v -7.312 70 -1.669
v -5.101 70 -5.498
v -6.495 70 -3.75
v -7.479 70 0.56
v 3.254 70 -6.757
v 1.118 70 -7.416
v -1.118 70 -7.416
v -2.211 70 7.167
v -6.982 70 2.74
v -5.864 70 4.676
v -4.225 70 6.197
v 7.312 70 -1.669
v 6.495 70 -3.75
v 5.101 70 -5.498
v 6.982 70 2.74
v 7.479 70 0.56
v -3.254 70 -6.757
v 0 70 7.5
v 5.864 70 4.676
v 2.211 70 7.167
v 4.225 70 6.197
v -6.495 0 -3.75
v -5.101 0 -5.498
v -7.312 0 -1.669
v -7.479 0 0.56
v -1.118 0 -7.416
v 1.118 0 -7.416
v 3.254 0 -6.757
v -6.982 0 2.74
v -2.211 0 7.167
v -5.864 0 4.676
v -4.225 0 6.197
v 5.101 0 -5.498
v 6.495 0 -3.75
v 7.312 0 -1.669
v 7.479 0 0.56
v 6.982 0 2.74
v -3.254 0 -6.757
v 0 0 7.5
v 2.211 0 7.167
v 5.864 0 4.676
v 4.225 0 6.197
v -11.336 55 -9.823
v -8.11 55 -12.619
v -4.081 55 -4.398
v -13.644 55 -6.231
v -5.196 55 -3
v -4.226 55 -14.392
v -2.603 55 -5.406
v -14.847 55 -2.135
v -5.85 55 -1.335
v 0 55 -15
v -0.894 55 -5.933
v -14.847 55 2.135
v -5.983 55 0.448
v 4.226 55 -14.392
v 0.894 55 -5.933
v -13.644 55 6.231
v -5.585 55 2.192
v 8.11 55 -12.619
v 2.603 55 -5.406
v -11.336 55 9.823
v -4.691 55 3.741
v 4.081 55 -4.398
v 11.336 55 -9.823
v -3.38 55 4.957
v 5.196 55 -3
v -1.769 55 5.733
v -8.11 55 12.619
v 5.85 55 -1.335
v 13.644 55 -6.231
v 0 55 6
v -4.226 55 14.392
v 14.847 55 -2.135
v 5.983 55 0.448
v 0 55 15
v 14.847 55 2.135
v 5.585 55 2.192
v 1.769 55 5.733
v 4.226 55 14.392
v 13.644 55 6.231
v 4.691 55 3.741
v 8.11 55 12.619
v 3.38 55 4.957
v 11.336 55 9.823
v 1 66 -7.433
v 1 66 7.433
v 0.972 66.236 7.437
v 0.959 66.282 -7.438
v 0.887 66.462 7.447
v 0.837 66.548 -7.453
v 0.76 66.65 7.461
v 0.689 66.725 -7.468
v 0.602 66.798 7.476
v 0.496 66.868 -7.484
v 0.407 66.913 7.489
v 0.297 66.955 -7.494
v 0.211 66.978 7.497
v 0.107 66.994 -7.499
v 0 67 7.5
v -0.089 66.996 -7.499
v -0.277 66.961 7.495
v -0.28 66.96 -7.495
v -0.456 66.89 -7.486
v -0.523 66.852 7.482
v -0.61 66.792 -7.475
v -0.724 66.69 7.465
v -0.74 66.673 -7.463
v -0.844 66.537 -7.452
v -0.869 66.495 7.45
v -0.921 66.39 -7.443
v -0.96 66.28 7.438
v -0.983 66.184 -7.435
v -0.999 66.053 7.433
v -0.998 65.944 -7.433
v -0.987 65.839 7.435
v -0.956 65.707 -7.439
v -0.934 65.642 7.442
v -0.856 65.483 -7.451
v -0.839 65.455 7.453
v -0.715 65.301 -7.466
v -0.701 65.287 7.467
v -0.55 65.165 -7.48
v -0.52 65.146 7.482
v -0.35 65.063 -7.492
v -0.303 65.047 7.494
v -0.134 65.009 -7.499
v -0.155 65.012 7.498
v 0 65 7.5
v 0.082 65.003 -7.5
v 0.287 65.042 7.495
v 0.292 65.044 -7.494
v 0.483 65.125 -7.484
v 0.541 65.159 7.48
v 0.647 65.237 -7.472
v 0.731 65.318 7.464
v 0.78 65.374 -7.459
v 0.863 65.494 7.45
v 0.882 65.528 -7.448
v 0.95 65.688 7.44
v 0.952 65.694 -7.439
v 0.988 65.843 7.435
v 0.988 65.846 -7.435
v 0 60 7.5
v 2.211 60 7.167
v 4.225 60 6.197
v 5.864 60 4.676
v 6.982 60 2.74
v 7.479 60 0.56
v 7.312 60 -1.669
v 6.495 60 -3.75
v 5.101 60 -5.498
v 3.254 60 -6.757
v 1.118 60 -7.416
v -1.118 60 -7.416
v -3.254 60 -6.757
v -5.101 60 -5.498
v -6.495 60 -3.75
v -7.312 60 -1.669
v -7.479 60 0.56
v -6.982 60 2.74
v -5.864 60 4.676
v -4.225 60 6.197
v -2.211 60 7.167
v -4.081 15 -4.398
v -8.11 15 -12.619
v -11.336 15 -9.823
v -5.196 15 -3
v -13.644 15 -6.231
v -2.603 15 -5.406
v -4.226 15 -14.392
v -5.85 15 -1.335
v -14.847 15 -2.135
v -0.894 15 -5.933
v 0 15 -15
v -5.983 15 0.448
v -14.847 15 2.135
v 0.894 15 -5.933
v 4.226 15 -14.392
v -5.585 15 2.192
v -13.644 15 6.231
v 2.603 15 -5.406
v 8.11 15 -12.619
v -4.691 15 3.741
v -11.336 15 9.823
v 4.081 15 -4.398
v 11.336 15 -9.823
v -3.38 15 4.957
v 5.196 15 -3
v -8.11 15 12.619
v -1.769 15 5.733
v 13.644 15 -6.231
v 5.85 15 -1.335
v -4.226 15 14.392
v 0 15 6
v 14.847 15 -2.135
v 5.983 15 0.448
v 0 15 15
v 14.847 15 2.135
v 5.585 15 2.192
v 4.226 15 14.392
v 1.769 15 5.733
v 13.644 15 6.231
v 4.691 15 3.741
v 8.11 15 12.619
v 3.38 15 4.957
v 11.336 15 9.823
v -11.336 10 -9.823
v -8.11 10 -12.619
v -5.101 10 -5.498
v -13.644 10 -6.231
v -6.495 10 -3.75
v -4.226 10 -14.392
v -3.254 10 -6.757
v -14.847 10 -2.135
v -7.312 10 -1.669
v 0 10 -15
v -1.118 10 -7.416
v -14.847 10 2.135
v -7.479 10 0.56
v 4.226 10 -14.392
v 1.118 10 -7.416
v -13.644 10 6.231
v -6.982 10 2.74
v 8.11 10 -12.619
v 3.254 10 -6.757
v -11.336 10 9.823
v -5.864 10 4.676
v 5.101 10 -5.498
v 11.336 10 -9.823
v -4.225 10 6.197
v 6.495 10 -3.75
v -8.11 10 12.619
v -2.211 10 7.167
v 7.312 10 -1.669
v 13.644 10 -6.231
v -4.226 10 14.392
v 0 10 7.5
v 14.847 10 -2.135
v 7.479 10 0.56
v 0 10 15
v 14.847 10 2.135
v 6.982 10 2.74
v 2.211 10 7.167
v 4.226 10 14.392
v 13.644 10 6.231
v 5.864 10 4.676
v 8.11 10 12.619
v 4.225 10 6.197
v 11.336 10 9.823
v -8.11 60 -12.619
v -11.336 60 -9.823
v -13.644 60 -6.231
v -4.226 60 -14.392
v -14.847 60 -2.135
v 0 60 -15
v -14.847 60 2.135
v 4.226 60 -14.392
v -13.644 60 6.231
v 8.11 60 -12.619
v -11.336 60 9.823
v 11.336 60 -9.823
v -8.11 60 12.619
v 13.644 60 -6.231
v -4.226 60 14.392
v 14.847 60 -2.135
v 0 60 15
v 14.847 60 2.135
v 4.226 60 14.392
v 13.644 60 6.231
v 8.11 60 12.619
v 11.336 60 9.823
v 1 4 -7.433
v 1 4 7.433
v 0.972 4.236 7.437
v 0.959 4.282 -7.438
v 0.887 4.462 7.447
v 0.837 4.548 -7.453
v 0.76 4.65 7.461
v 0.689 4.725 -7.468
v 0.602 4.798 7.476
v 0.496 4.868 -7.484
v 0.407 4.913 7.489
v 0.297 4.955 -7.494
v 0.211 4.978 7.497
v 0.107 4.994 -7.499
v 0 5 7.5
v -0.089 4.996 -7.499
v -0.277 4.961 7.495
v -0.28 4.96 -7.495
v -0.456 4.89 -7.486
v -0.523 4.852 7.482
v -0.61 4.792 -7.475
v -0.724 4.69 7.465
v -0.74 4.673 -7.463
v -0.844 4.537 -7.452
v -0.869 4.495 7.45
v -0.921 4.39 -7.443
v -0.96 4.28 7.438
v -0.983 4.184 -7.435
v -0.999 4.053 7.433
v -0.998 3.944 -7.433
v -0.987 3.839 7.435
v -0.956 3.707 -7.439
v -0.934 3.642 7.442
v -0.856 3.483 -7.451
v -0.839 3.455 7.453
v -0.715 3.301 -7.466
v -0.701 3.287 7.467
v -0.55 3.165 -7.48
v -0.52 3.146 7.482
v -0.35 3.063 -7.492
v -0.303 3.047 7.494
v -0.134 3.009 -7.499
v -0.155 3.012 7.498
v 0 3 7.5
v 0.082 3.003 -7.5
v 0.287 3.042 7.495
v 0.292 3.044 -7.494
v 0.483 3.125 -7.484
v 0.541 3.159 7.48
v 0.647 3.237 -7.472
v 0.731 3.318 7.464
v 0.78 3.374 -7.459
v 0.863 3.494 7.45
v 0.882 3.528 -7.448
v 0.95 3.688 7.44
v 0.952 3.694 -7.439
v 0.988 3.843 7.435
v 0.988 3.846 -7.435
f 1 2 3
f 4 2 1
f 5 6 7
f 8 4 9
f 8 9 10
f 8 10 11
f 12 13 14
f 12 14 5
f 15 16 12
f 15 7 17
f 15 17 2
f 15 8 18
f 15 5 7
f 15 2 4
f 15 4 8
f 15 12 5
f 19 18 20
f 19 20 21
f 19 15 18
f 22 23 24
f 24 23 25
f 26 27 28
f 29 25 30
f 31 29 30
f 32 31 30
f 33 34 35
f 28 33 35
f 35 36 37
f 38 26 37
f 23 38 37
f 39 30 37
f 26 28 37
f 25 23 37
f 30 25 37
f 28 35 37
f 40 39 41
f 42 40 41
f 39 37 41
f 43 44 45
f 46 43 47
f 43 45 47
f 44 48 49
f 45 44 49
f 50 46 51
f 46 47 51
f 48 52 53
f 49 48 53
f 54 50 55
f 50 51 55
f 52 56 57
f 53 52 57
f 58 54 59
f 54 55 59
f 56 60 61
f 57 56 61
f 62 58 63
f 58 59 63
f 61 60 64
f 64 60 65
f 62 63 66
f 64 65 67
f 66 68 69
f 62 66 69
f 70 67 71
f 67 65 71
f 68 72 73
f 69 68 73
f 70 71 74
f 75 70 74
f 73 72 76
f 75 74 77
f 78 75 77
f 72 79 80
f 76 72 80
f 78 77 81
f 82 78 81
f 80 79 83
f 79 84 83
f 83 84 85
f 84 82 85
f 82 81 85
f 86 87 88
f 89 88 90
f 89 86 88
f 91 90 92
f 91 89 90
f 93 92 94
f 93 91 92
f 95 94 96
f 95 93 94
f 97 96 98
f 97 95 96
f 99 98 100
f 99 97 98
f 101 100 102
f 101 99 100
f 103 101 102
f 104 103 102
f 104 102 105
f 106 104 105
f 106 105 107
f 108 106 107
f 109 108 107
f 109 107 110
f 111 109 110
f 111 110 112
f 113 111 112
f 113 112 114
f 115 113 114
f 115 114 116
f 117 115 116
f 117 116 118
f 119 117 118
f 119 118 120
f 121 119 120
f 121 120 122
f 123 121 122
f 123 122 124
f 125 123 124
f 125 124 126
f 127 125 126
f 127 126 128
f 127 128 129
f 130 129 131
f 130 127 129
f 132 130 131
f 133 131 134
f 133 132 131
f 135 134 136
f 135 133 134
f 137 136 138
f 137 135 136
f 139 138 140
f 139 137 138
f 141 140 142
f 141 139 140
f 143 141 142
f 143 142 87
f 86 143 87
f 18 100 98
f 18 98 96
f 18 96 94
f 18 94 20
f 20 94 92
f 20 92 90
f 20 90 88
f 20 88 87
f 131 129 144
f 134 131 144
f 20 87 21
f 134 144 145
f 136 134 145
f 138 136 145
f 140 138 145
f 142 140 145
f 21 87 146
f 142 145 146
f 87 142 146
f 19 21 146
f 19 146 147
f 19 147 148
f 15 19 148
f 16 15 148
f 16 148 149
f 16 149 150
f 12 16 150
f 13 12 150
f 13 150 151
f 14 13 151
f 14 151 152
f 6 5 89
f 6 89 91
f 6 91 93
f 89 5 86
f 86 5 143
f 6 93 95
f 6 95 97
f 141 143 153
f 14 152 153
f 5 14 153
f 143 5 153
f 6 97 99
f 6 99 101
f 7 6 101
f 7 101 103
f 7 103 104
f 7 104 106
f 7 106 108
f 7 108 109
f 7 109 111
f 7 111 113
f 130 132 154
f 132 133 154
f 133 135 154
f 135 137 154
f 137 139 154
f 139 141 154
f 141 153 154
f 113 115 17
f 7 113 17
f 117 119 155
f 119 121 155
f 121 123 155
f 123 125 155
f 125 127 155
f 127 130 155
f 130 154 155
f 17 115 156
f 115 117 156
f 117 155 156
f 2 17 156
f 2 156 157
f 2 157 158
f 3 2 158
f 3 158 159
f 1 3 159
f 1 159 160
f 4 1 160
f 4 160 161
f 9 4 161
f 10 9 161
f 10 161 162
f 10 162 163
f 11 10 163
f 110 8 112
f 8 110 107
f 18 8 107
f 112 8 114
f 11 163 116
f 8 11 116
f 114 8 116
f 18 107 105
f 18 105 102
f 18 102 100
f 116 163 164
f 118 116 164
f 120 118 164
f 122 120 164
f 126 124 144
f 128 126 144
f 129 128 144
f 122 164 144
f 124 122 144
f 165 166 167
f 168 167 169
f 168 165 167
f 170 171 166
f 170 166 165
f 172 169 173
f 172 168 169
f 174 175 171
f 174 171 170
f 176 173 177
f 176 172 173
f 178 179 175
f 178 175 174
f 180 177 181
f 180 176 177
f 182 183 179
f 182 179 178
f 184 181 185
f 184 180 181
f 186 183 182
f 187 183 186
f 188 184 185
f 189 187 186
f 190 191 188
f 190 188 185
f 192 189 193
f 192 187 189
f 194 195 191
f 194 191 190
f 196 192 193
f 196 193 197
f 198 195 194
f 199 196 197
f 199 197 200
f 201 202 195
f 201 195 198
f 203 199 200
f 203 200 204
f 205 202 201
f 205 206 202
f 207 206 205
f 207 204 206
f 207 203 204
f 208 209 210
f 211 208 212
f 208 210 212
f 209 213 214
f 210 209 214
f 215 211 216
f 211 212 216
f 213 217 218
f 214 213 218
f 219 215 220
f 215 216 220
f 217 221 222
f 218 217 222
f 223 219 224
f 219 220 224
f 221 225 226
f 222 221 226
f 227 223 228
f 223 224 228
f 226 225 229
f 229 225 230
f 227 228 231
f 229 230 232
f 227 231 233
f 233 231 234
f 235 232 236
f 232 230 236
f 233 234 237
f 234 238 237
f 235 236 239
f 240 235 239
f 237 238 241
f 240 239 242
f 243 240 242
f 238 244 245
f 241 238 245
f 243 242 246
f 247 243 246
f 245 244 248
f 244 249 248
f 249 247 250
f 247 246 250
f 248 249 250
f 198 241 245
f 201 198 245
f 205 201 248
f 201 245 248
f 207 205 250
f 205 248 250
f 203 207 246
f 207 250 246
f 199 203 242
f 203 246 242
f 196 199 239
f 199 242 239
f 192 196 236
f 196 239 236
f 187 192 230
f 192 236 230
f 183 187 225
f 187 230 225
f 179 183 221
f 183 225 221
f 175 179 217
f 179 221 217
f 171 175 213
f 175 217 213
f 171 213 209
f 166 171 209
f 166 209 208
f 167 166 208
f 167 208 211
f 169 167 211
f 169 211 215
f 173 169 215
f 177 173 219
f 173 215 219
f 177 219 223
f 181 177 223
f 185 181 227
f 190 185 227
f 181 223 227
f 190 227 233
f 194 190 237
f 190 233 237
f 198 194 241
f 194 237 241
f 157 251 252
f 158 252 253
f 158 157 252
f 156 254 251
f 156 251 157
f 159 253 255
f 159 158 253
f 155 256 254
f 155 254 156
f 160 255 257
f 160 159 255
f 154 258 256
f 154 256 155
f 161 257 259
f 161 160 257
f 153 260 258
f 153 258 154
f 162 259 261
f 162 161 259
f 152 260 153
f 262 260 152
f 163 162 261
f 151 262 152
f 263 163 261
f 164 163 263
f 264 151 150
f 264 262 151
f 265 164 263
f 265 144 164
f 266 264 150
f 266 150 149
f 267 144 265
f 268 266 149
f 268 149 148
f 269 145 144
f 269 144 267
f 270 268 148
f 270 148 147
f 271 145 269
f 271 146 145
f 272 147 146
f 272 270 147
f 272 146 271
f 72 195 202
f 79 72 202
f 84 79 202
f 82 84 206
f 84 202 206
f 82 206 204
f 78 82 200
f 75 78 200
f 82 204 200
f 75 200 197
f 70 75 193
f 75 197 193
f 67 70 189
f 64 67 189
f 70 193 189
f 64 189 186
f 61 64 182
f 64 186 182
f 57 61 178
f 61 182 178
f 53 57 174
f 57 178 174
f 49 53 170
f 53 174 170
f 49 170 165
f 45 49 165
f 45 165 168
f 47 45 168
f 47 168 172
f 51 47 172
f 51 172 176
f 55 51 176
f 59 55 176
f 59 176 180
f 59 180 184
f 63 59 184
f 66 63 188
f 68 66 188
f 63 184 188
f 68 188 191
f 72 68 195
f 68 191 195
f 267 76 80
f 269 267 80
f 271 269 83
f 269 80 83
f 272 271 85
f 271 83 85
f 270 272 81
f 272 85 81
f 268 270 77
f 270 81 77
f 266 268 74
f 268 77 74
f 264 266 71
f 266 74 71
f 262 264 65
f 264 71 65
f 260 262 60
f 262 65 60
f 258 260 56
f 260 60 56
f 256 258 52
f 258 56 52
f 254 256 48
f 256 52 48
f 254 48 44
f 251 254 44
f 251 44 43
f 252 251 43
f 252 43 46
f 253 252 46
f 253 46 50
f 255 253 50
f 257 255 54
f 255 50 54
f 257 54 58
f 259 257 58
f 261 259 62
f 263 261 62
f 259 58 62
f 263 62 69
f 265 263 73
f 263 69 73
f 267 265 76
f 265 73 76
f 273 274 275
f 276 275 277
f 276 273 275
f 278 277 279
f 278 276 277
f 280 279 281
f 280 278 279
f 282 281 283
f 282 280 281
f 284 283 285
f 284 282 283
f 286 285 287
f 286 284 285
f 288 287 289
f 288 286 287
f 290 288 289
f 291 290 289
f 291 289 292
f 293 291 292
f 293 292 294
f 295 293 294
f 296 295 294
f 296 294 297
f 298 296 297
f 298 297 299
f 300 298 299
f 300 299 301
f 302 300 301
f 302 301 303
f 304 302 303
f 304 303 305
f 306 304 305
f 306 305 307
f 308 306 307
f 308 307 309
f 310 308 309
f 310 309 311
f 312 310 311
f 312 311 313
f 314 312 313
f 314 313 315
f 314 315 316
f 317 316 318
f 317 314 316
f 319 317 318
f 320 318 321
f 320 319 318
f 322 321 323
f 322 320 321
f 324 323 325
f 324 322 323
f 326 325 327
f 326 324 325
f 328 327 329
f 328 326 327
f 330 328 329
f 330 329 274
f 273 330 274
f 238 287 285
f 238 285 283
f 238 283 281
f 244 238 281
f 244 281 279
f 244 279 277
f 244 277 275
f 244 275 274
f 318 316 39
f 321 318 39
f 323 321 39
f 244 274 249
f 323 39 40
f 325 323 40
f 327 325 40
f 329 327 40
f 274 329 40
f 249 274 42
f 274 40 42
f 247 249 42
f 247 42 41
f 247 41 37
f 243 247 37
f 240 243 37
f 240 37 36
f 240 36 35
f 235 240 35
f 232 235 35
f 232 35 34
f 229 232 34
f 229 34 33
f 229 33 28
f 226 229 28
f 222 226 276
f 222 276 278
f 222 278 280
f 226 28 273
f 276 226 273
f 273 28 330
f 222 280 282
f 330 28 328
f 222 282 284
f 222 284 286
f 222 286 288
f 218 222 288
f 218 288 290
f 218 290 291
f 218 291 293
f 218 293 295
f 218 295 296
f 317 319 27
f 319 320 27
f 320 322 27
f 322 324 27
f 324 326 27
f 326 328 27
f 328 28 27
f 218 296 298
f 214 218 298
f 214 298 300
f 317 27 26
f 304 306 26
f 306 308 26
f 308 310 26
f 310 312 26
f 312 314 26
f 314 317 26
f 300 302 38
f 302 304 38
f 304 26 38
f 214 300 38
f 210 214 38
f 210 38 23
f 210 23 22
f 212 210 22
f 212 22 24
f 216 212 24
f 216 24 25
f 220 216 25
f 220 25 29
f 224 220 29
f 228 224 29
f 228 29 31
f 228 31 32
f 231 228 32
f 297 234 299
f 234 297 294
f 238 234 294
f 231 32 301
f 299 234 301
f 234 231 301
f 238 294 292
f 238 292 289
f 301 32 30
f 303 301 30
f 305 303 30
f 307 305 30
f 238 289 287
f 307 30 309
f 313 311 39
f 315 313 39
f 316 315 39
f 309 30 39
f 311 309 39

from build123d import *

# Parameters (mm, degrees)
SKETCH1_R               = 7.5
BOSS_EXTRUDE1_DEPTH     = 10
SKETCH2_R               = 15
BOSS_EXTRUDE2_DEPTH     = 5
SKETCH3_R               = 6
BOSS_EXTRUDE3_DEPTH     = 40
SKETCH4_R               = 15
BOSS_EXTRUDE4_DEPTH     = 5
SKETCH5_R               = 7.5
BOSS_EXTRUDE5_DEPTH     = 10
CUT_EXTRUDE1_DEPTH      = 74.143694192
CUT_EXTRUDE1_DEPTH_BACK = 74.143694192
SKETCH6_R               = 1


with BuildPart() as part:
    # Sketch1 → Boss-Extrude1 (new body)
    with BuildSketch(Plane(origin=(0, 0, 0), x_dir=(1, 0, 0), z_dir=(0, 1, 0))):
        with Locations(Location((0, 0, 0), (0, 0, 270))):
            Circle(SKETCH1_R)
    extrude(amount=BOSS_EXTRUDE1_DEPTH)

    # Sketch2 → Boss-Extrude2 (add)
    with BuildSketch(Plane(origin=(0, 10, 0), x_dir=(1, 0, 0), z_dir=(0, 1, 0))):
        with Locations(Location((0, 0, 0), (0, 0, 270))):
            Circle(SKETCH2_R)
    extrude(amount=BOSS_EXTRUDE2_DEPTH)

    # Sketch3 → Boss-Extrude3 (add)
    with BuildSketch(Plane(origin=(0, 15, 0), x_dir=(1, 0, 0), z_dir=(0, 1, 0))):
        with Locations(Location((0, 0, 0), (0, 0, 270))):
            Circle(SKETCH3_R)
    extrude(amount=BOSS_EXTRUDE3_DEPTH)

    # Sketch4 → Boss-Extrude4 (add)
    with BuildSketch(Plane(origin=(0, 55, 0), x_dir=(1, 0, 0), z_dir=(0, 1, 0))):
        with Locations(Location((0, 0, 0), (0, 0, 270))):
            Circle(SKETCH4_R)
    extrude(amount=BOSS_EXTRUDE4_DEPTH)

    # Sketch5 → Boss-Extrude5 (add)
    with BuildSketch(Plane(origin=(0, 60, 0), x_dir=(1, 0, 0), z_dir=(0, 1, 0))):
        with Locations(Location((0, 0, 0), (0, 0, 270))):
            Circle(SKETCH5_R)
    extrude(amount=BOSS_EXTRUDE5_DEPTH)

    # Sketch6 → Cut-Extrude1 (cut, two sides: drawn at the far end of the back side and taken through both)
    with BuildSketch(Plane.XY.offset(-CUT_EXTRUDE1_DEPTH_BACK)):
        with Locations((0, 4)):
            Circle(SKETCH6_R)
        with Locations((0, 66)):
            Circle(SKETCH6_R)
    extrude(amount=CUT_EXTRUDE1_DEPTH + CUT_EXTRUDE1_DEPTH_BACK, mode=Mode.SUBTRACT)


solid = part.part
